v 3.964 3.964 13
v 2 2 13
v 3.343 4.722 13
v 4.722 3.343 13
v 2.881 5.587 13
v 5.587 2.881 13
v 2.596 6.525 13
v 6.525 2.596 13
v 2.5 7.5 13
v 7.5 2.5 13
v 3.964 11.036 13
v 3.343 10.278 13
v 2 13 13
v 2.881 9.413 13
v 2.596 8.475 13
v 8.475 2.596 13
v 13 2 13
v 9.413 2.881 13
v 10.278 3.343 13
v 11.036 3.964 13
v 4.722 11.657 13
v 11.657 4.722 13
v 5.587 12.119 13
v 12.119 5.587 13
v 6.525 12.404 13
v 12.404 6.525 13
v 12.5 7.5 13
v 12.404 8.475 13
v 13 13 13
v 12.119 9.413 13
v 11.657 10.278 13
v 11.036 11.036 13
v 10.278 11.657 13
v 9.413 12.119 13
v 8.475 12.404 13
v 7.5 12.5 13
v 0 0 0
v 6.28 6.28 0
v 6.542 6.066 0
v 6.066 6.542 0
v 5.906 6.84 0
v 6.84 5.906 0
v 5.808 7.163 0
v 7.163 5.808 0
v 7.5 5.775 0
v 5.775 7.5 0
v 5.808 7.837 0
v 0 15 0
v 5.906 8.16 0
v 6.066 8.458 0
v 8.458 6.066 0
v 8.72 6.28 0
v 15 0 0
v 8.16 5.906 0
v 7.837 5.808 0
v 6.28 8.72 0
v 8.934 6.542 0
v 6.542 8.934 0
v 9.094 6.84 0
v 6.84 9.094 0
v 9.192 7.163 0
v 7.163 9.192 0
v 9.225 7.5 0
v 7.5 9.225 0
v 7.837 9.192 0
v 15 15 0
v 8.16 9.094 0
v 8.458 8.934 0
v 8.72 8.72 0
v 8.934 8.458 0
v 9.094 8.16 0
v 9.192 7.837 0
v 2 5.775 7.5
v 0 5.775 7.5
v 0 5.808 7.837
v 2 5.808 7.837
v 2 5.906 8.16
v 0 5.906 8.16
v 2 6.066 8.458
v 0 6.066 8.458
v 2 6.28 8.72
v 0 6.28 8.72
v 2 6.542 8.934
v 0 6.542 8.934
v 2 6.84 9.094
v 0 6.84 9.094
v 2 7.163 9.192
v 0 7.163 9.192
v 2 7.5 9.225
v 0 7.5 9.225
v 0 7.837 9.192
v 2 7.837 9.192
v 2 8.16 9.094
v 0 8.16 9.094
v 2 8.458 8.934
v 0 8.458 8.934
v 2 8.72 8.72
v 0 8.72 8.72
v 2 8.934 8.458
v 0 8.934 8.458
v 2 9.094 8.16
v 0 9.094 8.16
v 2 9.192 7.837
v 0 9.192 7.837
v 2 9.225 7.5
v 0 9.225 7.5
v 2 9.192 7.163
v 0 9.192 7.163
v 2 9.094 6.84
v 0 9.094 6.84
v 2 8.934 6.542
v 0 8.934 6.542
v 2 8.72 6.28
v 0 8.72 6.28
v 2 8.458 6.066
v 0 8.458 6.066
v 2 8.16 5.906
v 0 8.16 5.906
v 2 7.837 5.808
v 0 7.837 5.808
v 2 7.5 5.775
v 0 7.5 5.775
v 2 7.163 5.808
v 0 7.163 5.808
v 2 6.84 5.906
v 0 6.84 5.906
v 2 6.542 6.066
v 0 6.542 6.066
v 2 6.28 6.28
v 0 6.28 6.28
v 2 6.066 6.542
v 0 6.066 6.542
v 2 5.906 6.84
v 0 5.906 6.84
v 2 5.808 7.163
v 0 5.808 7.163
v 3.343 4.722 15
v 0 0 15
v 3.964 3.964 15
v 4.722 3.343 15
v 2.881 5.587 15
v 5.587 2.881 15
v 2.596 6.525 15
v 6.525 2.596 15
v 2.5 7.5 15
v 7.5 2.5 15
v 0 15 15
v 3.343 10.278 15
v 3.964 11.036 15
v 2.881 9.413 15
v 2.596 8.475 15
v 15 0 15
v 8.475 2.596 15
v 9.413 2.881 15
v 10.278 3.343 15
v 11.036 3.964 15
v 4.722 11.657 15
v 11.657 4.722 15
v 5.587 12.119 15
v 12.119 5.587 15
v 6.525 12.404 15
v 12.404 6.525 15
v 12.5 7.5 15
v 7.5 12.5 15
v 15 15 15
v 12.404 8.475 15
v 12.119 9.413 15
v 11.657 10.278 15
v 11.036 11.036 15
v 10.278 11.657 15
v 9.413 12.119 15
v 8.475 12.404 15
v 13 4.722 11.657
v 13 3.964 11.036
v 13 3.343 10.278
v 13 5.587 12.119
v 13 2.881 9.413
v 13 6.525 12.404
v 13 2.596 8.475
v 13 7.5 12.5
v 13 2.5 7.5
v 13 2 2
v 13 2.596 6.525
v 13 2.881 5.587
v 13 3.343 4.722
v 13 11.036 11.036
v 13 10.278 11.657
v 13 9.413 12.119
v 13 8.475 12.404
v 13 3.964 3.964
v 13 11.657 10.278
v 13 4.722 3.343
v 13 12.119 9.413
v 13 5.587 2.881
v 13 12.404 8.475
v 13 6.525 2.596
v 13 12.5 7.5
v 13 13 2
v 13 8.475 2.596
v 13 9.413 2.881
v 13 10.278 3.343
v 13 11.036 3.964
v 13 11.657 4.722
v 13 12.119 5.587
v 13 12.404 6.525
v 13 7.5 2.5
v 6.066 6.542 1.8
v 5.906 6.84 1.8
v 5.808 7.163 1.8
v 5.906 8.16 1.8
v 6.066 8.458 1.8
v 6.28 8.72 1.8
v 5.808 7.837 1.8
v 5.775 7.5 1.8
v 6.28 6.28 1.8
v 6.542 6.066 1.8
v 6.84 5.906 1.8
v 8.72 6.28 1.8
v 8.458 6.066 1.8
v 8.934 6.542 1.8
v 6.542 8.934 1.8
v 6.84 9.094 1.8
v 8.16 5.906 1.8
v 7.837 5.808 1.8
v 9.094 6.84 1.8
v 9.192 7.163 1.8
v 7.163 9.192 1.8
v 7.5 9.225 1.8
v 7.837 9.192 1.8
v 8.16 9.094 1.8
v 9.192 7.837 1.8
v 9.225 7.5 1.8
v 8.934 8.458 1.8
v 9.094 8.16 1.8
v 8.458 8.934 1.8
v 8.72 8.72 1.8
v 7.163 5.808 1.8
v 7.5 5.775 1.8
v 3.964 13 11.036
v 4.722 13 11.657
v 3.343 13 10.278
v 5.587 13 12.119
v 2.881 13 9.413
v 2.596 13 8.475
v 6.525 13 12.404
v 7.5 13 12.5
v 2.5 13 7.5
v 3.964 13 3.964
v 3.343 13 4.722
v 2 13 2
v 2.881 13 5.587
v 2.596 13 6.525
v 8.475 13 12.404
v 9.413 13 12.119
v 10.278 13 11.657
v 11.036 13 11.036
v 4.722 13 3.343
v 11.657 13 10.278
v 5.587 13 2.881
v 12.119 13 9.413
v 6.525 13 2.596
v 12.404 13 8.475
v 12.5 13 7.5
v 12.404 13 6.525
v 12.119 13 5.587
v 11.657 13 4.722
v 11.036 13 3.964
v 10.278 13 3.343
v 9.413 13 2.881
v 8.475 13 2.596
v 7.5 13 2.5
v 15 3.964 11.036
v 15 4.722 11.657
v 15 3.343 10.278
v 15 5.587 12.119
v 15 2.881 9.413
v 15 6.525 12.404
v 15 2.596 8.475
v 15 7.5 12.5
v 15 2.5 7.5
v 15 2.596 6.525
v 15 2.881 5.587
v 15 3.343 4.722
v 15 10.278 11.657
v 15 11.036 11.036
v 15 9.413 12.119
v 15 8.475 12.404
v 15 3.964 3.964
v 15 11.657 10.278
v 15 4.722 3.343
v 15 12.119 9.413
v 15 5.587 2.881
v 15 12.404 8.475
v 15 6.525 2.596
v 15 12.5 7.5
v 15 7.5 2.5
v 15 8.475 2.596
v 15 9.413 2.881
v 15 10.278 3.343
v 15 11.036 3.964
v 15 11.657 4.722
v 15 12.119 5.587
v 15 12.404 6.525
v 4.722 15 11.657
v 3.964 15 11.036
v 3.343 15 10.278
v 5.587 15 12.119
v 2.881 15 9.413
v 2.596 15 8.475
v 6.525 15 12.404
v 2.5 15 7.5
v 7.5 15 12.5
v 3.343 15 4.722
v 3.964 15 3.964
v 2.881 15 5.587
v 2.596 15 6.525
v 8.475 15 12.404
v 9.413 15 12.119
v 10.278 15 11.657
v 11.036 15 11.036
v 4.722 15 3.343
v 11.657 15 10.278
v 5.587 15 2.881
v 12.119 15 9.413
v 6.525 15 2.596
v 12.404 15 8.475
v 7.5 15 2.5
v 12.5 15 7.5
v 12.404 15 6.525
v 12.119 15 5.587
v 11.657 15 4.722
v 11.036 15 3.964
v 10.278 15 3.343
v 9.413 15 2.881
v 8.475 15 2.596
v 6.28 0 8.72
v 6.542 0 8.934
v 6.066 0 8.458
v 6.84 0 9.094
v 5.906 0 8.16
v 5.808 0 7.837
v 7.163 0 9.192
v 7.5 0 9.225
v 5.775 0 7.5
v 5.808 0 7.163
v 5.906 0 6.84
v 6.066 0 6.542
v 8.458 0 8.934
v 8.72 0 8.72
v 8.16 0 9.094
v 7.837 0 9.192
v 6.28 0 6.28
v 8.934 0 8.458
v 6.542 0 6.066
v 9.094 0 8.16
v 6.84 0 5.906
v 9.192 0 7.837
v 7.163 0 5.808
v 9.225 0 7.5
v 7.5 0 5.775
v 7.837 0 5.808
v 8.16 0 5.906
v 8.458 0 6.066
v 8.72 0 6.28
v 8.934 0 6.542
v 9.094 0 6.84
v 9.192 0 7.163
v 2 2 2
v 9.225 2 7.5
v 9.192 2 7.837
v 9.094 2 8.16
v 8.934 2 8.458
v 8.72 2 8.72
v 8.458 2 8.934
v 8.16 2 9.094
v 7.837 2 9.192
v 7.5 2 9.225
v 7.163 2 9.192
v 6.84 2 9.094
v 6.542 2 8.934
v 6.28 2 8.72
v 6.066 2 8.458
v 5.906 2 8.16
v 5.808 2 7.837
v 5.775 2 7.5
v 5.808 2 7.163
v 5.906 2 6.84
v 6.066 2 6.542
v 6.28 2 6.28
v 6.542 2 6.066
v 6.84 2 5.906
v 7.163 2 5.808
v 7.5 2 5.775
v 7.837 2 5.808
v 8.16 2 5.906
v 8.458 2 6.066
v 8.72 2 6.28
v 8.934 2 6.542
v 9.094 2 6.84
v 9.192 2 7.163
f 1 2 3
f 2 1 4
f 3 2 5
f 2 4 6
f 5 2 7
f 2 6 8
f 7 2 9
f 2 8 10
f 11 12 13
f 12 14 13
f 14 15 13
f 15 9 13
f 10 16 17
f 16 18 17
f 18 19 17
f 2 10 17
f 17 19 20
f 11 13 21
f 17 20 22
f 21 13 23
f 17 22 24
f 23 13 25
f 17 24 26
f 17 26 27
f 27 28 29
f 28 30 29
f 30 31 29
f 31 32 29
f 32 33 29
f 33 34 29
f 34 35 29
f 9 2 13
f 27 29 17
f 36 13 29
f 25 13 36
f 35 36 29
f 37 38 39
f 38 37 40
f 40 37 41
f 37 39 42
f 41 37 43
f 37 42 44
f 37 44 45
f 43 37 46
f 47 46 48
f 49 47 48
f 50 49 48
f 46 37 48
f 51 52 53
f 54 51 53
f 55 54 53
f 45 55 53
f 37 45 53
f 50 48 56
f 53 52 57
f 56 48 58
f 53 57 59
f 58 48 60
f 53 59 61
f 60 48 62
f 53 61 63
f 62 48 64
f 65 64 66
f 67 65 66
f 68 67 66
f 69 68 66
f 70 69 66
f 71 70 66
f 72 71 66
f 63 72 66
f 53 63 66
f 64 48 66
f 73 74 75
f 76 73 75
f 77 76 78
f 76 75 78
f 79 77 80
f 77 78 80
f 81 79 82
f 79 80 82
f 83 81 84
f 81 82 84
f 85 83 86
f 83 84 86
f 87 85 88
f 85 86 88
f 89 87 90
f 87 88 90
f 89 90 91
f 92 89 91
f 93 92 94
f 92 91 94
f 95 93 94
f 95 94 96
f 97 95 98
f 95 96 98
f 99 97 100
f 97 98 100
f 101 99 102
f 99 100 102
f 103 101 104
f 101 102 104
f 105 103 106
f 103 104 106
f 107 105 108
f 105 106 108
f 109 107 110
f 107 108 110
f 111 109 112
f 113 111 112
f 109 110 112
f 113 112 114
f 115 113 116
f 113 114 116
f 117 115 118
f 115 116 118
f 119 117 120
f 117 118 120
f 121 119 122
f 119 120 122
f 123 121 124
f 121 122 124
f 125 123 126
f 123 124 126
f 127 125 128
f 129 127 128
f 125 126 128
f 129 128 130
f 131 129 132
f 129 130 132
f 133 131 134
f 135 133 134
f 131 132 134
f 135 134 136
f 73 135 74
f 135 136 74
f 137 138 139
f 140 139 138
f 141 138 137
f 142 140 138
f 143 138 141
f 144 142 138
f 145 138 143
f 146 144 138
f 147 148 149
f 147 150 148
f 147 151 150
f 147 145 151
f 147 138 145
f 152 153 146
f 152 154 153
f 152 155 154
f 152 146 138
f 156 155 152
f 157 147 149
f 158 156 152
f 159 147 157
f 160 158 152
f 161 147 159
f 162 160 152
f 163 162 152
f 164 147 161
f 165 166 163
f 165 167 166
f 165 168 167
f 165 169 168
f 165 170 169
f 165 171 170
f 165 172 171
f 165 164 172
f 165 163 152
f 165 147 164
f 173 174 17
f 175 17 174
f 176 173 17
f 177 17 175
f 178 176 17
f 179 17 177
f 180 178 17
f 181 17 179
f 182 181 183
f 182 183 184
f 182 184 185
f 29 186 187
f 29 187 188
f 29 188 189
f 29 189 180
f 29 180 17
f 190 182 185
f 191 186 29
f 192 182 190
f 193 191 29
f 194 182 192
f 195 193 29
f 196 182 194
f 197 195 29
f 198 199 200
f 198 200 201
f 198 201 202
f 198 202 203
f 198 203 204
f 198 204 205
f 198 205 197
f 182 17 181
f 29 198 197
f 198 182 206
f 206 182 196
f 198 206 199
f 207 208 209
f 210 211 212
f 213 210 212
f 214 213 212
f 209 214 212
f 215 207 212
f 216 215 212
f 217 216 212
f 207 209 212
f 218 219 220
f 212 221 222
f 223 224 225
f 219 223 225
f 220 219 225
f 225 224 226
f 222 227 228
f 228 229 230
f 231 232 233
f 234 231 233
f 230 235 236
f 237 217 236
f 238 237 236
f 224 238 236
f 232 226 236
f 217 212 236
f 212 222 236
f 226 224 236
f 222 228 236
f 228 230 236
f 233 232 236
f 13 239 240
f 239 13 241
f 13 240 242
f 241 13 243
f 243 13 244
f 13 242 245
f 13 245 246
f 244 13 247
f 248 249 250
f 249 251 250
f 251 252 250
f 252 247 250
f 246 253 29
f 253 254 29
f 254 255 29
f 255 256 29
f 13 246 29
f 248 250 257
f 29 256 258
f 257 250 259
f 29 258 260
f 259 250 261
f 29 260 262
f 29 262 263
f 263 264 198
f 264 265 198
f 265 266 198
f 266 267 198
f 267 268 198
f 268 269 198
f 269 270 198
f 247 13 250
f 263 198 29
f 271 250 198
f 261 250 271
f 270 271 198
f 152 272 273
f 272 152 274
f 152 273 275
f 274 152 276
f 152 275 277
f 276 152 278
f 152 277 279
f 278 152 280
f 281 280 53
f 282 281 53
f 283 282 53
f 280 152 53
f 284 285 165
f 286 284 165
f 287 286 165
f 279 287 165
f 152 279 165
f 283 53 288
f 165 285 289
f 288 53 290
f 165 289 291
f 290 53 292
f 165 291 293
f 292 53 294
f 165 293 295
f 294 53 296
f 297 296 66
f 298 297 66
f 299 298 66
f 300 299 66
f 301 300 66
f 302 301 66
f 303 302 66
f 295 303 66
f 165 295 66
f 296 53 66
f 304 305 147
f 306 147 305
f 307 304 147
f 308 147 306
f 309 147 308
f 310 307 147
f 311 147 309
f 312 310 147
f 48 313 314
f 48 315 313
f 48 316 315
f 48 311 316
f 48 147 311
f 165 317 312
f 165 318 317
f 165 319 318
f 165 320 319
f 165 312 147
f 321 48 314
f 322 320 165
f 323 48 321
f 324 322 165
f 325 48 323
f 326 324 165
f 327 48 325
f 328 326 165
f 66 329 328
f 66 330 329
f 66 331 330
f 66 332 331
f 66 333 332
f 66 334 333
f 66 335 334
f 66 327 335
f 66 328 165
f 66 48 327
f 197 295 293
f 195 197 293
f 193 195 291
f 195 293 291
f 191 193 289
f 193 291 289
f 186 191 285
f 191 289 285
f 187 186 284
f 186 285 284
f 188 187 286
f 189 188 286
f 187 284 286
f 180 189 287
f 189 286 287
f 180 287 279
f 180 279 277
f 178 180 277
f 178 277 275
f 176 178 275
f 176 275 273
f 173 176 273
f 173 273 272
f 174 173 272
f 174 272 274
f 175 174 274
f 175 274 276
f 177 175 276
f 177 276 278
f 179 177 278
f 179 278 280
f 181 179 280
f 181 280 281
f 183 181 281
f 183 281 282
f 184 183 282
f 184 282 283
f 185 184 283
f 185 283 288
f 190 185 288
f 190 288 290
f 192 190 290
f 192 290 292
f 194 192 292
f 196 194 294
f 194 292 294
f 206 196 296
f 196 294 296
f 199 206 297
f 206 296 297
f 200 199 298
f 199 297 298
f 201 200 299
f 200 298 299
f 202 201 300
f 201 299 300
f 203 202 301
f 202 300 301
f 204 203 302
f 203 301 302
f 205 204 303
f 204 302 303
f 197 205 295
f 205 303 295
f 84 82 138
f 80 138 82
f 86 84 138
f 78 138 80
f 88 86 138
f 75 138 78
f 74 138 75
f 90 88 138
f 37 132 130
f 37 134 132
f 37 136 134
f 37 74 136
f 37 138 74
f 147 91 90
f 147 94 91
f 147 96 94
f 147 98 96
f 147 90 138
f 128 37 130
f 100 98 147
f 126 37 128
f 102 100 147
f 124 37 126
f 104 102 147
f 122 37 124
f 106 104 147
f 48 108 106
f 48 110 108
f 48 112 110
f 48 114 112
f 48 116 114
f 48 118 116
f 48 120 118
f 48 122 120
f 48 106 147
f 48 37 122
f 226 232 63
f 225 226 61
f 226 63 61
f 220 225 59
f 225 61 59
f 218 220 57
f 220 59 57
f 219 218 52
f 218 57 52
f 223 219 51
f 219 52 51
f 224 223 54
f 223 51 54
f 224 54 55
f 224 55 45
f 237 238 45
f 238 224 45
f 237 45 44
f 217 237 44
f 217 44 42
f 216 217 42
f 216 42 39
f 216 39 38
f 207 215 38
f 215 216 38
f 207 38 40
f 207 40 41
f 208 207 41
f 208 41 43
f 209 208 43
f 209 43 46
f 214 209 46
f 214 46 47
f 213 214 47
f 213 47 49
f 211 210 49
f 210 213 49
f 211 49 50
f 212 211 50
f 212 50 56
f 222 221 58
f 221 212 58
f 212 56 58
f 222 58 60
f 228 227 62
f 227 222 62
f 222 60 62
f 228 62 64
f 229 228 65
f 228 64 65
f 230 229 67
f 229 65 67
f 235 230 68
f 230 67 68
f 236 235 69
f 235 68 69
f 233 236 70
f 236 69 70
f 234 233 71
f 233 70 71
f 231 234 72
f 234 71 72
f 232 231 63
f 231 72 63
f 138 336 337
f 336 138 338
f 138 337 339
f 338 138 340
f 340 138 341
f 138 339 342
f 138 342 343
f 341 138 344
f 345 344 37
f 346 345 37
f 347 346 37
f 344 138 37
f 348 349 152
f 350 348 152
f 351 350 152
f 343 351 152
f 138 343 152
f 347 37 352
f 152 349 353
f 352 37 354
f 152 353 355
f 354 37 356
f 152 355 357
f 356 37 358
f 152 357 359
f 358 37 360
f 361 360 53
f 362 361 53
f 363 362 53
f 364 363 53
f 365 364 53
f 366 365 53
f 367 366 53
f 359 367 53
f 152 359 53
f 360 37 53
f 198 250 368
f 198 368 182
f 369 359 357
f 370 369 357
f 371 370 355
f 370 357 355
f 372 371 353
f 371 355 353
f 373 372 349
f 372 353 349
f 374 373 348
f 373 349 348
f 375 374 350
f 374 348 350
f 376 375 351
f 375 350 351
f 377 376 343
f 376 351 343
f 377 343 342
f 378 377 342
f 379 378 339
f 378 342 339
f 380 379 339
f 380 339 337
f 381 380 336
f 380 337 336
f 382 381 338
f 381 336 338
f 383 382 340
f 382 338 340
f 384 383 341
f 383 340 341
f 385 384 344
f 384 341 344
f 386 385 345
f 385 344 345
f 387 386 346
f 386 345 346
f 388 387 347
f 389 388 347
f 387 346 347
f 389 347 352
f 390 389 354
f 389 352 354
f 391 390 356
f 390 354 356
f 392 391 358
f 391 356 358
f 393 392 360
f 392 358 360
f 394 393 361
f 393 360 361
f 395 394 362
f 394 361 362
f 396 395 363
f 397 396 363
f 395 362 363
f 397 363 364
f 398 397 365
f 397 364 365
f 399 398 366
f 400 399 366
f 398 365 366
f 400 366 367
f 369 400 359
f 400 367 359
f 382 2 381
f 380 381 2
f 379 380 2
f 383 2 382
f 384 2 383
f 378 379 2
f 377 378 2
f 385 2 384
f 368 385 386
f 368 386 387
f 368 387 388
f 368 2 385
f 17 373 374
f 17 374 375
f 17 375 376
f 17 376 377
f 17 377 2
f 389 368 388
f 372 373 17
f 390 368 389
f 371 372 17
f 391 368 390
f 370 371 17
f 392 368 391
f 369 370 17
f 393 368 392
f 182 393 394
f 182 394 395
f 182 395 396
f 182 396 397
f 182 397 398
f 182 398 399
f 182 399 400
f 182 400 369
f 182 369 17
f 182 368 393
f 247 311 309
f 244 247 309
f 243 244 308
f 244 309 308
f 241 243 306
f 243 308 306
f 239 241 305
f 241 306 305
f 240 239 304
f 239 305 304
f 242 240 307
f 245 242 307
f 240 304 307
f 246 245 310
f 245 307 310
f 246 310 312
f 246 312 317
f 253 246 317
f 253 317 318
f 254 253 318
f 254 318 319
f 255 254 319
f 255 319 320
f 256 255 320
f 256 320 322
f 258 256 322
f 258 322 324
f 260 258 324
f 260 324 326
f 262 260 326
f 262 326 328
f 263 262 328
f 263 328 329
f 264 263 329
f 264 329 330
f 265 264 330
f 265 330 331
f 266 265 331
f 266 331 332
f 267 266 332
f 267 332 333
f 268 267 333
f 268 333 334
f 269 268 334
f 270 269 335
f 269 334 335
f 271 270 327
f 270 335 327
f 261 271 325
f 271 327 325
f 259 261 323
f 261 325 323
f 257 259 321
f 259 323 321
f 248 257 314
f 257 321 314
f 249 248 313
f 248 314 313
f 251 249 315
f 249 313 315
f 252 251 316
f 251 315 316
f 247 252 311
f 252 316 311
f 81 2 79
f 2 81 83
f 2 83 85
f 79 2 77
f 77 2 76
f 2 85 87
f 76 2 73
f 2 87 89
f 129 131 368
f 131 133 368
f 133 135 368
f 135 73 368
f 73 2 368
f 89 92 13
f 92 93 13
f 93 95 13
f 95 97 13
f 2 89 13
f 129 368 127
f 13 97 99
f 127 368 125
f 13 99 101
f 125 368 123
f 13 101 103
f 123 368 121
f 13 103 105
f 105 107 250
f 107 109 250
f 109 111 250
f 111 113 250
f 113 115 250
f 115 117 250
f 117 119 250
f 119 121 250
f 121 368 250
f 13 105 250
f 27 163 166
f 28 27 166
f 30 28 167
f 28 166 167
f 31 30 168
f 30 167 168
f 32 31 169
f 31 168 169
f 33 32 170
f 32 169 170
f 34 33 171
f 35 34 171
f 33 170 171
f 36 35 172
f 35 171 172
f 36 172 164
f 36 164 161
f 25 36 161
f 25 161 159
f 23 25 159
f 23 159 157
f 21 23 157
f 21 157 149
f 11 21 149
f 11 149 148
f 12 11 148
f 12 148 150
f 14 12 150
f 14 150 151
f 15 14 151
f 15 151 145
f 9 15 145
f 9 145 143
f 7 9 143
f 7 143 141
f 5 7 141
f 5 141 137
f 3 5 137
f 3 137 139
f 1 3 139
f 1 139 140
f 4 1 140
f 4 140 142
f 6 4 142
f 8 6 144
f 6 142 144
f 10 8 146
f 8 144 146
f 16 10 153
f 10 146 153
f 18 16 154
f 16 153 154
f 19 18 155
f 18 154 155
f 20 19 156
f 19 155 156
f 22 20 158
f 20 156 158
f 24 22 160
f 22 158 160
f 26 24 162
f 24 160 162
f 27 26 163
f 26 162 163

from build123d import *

# Parameters (mm, degrees)
F0_W      = 15
F0_H      = 15
F1_DEPTH  = 15
F2_W      = 11
F2_H      = 11
F3_DEPTH  = 11
F6_R      = 1.725
F7_DEPTH  = 2
F8_R      = 1.725
F9_DEPTH  = 2
F10_R     = 1.725
F11_DEPTH = 2
F12_R     = 5
F13_DEPTH = 7.5
F14_R     = 5
F15_DEPTH = 7.5
F16_R     = 5
F17_DEPTH = 7.5
F18_R     = 3.5
F19_DEPTH = 13
F20_R     = 3.5
F21_DEPTH = 13
F22_R     = 3.5
F23_DEPTH = 13
F24_R     = 1.725
F25_DEPTH = 0.2


with BuildPart() as f1:
    # F0 (on Top) → F1 (new body)
    with BuildSketch(Plane.XY):
        with Locations((7.5, 7.5)):
            Rectangle(F0_W, F0_H)
    extrude(amount=F1_DEPTH)


with BuildPart() as f3:
    # F2 (on Top) → F3 (new body)
    with BuildSketch(Plane.XY):
        with Locations((7.5, 7.5)):
            Rectangle(F2_W, F2_H)
    extrude(amount=F3_DEPTH)


with BuildPart() as f3_1:
    # F4: moved
    add(f3.part.moved(Location((0, 0, 2))))


with BuildPart() as f1_1:
    add(f1.part)

    # F5: cut F3
    add(f3_1.part, mode=Mode.SUBTRACT)

    # F6 (on face) → F7 (cut, through all)
    with BuildSketch(Plane.XZ):
        with Locations((7.5, 7.5)):
            Circle(F6_R)
    extrude(amount=-F7_DEPTH, mode=Mode.SUBTRACT)

    # F8 (on face) → F9 (cut, through all)
    with BuildSketch(Plane(origin=(0, 0, 0), x_dir=(0, -1, 0), z_dir=(-1, 0, 0))):
        with Locations((-7.5, 7.5)):
            Circle(F8_R)
    extrude(amount=-F9_DEPTH, mode=Mode.SUBTRACT)

    # F10 (on face) → F11 (cut, through all)
    with BuildSketch(Plane(origin=(0, 0, 0), x_dir=(1, 0, 0), z_dir=(0, 0, -1))):
        with Locations((7.5, -7.5)):
            Circle(F10_R)
    extrude(amount=-F11_DEPTH, mode=Mode.SUBTRACT)

    # F12 (on face) → F13 (cut)
    with BuildSketch(Plane(origin=(0, 15, 0), x_dir=(-1, 0, 0), z_dir=(0, 1, 0))):
        with Locations((-7.5, 7.5)):
            Circle(F12_R)
    extrude(amount=-F13_DEPTH, mode=Mode.SUBTRACT)

    # F14 (on face) → F15 (cut)
    with BuildSketch(Plane.YZ.offset(15)):
        with Locations((7.5, 7.5)):
            Circle(F14_R)
    extrude(amount=-F15_DEPTH, mode=Mode.SUBTRACT)

    # F16 (on face) → F17 (cut)
    with BuildSketch(Plane.XY.offset(15)):
        with Locations((7.5, 7.5)):
            Circle(F16_R)
    extrude(amount=-F17_DEPTH, mode=Mode.SUBTRACT)

    # F18 (on face) → F19 (cut)
    with BuildSketch(Plane(origin=(0, 15, 0), x_dir=(-1, 0, 0), z_dir=(0, 1, 0))):
        with Locations((-7.5, 7.5)):
            Circle(F18_R)
    extrude(amount=-F19_DEPTH, mode=Mode.SUBTRACT)

    # F20 (on face) → F21 (cut)
    with BuildSketch(Plane.YZ.offset(15)):
        with Locations((7.5, 7.5)):
            Circle(F20_R)
    extrude(amount=-F21_DEPTH, mode=Mode.SUBTRACT)

    # F22 (on face) → F23 (cut)
    with BuildSketch(Plane.XY.offset(15)):
        with Locations((7.5, 7.5)):
            Circle(F22_R)
    extrude(amount=-F23_DEPTH, mode=Mode.SUBTRACT)

    # F24 (on face) → F25 (join)
    with BuildSketch(Plane.XY.offset(2)):
        with Locations((7.5, 7.5)):
            Circle(F24_R)
    extrude(amount=-F25_DEPTH)


solid = f1_1.part
